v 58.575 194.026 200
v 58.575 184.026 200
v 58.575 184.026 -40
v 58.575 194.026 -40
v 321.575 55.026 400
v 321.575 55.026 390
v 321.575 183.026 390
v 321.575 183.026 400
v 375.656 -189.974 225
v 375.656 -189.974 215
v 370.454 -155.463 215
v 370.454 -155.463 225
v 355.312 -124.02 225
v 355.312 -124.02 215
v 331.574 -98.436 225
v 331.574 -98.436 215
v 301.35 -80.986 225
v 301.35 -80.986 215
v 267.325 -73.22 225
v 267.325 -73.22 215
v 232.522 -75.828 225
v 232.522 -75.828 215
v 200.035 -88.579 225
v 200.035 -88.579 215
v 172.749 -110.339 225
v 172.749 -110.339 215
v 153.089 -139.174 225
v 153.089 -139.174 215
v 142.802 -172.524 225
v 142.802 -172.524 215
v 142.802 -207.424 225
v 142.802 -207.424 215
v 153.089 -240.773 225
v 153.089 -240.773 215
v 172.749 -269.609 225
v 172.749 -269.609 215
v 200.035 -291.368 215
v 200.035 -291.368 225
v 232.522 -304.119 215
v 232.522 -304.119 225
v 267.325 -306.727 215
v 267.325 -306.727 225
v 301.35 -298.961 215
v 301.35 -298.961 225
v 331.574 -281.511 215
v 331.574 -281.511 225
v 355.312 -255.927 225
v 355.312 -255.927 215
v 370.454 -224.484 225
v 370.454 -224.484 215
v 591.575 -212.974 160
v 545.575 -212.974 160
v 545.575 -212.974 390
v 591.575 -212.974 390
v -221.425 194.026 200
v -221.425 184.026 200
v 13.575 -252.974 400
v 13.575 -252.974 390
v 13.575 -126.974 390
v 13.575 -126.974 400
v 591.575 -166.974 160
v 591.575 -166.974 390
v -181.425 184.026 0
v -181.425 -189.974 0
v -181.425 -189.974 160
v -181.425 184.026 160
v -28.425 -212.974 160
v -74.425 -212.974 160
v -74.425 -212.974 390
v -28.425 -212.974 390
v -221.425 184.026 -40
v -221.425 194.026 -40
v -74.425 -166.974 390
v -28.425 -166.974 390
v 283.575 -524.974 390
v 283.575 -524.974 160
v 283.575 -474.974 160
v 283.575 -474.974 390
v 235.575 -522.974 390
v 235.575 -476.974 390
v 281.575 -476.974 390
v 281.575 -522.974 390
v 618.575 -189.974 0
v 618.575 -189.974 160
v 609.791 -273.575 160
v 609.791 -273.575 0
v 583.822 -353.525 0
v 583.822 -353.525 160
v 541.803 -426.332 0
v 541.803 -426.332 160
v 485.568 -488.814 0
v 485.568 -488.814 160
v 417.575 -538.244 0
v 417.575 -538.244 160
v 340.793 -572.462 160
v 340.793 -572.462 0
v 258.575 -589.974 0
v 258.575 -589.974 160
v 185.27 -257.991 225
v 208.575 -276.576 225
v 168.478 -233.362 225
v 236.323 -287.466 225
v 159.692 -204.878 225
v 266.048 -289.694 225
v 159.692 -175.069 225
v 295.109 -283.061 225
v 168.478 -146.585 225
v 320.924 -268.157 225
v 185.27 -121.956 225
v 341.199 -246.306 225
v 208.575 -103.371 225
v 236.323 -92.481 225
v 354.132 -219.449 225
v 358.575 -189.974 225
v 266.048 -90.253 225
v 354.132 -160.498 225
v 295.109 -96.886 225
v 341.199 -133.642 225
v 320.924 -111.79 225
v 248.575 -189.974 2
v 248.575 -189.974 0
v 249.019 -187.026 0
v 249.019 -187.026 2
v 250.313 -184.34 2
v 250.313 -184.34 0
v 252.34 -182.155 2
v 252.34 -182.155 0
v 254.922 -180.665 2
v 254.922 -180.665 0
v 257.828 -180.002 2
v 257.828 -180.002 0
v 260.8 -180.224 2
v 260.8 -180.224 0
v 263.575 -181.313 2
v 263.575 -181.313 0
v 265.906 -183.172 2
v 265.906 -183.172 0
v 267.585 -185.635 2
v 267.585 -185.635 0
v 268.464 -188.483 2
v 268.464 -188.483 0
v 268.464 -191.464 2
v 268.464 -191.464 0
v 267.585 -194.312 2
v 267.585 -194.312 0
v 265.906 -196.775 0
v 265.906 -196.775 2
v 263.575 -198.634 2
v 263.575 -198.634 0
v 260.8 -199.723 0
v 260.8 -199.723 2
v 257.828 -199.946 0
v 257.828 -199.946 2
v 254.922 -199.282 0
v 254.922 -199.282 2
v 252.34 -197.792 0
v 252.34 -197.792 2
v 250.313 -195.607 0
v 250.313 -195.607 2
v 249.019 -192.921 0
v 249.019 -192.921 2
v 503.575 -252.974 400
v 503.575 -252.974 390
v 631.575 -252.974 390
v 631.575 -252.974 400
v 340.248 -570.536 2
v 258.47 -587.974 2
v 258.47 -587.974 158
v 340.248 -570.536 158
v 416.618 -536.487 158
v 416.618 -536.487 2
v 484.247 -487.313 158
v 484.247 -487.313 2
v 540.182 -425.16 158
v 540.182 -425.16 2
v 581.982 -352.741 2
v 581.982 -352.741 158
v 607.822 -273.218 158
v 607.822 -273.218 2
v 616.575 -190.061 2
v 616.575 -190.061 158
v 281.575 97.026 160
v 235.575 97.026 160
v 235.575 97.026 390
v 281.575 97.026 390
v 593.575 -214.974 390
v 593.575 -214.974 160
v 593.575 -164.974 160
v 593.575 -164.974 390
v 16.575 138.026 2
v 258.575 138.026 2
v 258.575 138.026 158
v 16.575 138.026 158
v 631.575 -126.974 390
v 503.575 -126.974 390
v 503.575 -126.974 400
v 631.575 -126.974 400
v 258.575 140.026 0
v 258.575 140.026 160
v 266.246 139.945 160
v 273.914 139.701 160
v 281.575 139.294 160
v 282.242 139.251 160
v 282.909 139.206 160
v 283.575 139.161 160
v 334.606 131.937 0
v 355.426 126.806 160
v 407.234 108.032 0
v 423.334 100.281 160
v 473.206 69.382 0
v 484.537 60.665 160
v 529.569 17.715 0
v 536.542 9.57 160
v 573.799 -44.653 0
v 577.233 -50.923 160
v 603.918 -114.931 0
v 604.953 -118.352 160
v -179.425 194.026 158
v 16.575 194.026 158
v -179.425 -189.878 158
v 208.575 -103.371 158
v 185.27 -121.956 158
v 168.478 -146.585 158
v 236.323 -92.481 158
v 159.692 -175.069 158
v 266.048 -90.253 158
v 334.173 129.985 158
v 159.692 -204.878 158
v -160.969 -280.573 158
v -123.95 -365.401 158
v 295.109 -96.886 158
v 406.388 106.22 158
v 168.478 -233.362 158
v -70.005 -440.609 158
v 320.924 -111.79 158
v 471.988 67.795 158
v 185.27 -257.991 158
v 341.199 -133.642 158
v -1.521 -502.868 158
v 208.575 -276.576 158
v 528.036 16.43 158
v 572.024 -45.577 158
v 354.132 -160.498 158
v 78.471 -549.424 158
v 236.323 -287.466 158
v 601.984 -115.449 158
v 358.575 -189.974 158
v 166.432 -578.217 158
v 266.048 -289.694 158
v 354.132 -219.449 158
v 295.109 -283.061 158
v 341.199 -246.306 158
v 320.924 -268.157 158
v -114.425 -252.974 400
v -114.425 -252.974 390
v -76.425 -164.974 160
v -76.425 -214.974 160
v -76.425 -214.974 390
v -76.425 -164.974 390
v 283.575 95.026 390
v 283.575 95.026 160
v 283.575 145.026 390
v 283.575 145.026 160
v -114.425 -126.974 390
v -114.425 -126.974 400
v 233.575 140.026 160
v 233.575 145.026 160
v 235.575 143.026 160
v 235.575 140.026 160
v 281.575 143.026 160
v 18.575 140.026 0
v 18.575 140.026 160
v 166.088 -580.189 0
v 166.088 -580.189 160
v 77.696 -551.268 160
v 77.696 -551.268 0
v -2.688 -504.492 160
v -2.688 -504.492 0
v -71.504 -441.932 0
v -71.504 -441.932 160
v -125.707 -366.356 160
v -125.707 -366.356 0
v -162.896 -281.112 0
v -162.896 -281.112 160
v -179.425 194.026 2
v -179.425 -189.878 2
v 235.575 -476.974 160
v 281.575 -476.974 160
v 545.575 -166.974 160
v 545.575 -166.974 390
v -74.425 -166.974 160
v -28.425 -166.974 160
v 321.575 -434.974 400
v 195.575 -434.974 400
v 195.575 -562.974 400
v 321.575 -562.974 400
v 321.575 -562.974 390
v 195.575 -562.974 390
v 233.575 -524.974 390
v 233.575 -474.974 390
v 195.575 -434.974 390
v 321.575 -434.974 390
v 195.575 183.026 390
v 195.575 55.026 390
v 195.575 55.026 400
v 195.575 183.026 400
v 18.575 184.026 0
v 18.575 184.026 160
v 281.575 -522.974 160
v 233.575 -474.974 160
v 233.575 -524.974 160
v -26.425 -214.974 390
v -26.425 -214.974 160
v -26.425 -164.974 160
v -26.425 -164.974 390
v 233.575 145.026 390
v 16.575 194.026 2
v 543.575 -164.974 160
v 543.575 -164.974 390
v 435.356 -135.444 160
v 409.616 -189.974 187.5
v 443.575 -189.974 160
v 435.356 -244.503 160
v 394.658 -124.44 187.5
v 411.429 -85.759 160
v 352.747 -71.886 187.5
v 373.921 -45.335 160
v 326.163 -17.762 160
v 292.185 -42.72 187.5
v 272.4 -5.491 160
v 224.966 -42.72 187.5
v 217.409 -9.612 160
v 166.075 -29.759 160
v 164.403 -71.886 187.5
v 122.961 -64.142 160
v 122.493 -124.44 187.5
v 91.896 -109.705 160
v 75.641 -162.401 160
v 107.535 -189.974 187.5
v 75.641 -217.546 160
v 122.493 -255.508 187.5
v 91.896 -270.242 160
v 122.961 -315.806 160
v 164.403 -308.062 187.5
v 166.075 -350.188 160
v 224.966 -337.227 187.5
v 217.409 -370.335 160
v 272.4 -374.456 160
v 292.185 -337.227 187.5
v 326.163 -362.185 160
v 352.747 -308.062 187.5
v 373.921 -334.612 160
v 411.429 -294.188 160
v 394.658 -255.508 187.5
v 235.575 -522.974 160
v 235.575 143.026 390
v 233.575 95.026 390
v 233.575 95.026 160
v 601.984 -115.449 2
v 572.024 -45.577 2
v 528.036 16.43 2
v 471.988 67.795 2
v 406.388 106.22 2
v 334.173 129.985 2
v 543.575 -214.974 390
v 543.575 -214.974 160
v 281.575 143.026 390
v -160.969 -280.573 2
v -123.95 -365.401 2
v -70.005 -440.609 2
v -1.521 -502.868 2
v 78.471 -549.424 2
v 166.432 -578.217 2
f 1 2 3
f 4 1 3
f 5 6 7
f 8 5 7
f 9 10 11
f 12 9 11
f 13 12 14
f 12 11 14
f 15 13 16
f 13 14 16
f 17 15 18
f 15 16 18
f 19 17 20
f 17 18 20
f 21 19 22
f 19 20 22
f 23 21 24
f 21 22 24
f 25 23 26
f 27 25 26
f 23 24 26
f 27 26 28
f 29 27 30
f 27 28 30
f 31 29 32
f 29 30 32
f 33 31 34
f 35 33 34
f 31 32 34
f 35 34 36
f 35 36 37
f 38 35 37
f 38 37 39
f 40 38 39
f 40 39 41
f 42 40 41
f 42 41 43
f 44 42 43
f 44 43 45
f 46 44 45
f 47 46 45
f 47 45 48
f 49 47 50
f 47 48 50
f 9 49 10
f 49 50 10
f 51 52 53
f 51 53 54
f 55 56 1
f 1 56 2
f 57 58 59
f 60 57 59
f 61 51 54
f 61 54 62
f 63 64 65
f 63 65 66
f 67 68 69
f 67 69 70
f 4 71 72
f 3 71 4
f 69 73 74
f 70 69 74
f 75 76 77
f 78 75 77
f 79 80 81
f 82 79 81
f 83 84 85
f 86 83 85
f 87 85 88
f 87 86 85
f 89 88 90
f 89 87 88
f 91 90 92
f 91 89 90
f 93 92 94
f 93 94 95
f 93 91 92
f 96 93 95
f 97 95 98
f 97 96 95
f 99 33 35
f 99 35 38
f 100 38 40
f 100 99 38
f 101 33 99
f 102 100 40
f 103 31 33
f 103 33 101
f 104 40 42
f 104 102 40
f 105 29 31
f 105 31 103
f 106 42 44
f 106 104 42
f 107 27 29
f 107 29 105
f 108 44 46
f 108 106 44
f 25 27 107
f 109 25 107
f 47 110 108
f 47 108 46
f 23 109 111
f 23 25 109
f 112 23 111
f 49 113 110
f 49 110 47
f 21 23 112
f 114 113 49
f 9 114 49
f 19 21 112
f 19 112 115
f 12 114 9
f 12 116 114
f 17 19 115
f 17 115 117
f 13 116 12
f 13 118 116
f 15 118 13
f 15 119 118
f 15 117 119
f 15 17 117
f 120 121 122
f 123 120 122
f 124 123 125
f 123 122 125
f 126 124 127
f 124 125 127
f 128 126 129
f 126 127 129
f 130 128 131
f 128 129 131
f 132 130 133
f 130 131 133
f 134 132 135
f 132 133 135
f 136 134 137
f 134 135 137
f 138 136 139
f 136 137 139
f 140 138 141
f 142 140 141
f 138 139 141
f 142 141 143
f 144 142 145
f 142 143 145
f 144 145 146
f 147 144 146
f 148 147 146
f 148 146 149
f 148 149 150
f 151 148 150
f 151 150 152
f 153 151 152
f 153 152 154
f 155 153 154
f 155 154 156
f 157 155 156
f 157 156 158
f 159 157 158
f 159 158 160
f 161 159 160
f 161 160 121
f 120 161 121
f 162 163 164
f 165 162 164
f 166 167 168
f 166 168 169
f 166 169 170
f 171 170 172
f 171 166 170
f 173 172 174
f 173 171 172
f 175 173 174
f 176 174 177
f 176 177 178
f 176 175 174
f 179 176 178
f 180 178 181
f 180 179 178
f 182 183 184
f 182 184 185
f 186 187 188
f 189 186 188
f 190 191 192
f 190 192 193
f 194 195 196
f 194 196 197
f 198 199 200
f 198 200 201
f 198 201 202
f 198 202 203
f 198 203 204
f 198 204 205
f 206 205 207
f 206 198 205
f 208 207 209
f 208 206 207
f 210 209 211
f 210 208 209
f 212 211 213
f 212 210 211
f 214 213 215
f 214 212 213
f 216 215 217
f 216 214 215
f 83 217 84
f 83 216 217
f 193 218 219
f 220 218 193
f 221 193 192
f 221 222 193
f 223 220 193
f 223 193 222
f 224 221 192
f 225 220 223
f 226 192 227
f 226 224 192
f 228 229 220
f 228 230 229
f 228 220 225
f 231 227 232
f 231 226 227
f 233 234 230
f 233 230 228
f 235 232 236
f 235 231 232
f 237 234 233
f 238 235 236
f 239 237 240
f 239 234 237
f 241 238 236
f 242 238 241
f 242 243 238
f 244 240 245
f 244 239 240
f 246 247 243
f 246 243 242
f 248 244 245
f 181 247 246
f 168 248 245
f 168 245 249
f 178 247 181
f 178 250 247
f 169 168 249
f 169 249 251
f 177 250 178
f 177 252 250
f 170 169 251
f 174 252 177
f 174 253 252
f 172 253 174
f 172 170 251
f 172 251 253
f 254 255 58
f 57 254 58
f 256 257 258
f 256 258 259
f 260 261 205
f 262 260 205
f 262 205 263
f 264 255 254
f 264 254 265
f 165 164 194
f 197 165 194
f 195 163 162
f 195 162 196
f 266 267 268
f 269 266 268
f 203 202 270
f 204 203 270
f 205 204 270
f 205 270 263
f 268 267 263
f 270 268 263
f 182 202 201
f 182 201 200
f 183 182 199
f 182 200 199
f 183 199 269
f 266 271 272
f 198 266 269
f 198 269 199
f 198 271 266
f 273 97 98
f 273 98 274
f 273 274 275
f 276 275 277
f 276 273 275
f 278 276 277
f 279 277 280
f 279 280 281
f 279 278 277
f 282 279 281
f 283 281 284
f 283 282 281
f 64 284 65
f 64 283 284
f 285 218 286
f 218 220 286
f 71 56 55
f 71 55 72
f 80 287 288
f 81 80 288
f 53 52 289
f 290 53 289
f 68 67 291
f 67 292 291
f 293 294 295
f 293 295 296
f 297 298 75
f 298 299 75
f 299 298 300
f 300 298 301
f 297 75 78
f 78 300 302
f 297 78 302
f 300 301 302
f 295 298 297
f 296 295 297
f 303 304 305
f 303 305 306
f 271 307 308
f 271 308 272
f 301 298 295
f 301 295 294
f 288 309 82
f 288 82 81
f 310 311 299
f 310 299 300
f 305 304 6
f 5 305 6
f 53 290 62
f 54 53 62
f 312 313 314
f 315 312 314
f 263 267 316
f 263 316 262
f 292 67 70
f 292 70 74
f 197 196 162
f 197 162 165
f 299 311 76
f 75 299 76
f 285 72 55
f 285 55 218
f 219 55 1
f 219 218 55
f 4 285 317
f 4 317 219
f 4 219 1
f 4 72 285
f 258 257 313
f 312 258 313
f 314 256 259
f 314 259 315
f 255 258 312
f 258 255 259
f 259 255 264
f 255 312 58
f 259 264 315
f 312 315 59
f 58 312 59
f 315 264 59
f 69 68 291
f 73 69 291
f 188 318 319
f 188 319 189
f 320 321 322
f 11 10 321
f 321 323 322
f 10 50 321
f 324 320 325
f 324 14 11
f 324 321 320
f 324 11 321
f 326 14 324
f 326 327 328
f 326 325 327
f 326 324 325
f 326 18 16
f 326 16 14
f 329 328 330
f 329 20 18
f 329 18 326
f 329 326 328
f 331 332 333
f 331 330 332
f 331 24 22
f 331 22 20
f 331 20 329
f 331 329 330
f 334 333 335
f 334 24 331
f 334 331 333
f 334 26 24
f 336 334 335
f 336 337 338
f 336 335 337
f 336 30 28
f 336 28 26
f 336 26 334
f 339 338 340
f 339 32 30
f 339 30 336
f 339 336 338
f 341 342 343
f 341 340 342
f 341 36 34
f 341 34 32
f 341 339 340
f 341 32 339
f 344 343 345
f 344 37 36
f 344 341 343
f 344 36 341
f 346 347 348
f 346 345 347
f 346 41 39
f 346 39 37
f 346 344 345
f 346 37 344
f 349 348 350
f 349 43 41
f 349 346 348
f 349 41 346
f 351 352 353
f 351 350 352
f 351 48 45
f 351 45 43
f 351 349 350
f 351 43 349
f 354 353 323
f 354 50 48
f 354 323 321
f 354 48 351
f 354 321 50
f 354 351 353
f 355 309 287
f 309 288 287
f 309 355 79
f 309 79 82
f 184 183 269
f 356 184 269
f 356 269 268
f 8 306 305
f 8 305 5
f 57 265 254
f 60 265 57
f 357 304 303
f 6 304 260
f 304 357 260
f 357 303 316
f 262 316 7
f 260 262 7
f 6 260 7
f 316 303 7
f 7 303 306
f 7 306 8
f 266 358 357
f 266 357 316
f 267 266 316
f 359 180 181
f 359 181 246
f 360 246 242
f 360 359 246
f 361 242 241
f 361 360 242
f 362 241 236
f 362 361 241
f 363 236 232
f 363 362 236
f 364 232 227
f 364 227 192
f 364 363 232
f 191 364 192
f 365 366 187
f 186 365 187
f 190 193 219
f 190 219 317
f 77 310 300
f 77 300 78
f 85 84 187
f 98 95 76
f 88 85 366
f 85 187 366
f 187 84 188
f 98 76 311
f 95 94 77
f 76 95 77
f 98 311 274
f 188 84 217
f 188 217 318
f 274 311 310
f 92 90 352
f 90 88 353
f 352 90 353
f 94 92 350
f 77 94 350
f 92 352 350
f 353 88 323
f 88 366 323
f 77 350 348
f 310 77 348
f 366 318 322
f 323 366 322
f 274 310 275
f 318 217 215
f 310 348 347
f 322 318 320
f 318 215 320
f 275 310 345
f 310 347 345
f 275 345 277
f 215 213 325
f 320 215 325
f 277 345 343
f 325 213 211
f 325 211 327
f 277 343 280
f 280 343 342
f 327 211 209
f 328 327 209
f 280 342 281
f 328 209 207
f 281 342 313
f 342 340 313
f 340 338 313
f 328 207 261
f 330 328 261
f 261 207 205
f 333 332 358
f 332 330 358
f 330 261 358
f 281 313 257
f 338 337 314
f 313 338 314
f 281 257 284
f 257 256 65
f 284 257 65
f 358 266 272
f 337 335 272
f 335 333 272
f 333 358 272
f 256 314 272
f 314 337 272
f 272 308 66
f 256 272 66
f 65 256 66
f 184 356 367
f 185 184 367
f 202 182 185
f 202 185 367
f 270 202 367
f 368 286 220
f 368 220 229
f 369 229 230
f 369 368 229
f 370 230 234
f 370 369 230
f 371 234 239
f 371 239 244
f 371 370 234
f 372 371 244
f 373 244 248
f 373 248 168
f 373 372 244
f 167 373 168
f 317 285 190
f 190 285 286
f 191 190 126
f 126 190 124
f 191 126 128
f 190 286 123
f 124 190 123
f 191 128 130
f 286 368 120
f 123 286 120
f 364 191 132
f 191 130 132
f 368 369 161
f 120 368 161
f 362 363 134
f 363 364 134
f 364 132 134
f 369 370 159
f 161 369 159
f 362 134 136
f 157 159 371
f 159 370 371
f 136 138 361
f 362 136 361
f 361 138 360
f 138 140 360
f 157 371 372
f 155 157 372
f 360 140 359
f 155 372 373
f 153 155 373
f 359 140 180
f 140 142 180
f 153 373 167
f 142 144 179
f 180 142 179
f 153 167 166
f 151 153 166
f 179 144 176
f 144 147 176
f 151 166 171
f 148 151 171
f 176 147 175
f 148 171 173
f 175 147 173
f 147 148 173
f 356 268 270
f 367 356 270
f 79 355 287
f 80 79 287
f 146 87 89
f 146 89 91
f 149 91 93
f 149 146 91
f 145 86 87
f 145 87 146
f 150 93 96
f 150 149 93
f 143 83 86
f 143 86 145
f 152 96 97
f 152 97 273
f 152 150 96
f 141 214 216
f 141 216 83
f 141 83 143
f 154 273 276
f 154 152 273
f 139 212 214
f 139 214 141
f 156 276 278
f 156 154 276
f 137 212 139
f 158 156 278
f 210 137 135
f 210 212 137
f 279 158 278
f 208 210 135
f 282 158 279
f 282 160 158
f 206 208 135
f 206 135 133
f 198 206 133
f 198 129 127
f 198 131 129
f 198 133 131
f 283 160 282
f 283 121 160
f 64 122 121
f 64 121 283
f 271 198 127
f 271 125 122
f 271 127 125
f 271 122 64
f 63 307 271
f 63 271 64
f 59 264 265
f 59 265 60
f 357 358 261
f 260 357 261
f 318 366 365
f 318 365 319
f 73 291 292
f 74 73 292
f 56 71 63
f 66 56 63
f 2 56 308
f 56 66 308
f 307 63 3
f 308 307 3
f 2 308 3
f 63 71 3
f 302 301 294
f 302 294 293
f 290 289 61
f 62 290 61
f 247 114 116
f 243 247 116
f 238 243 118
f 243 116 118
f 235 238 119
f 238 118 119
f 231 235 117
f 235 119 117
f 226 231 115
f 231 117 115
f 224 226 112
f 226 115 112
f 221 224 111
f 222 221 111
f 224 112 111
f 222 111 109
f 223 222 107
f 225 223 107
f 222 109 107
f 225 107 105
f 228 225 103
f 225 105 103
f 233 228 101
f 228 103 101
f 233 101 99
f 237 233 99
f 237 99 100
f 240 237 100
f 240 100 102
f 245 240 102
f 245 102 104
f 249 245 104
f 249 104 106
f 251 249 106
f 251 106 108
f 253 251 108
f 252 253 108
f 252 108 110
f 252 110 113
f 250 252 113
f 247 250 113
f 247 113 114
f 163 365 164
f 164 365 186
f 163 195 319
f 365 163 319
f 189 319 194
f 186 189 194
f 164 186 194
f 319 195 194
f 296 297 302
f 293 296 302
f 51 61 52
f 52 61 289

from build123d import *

# Parameters (mm, degrees)
BOSS_EXTRUDE1_DEPTH       = 160
SHELL4_START              = 2
SHELL4_DEPTH              = 156
SKETCH5_R                 = 90
CUT_EXTRUDE1_DEPTH        = 118
SKETCH6_R                 = 185
BOSS_EXTRUDE2_DEPTH       = 55
BOSS_EXTRUDE2_TAPER       = 51
SKETCH7_R                 = 117.080656391
BOSS_EXTRUDE3_DEPTH       = 10
SKETCH9_R                 = 100
CUT_EXTRUDE2_DEPTH        = 118
SKETCH11_R                = 10
CUT_EXTRUDE3_DEPTH        = 118
SKETCH12_W                = 280
SKETCH12_H                = 240
SKETCH12_W_2              = 196
SKETCH12_H_2              = 156
BOSS_EXTRUDE4_DEPTH       = 10
EXTRUDE_THIN1_OUTLINE_W   = 50
EXTRUDE_THIN1_OUTLINE_H   = 50
EXTRUDE_THIN1_OUTLINE_W_2 = 46
EXTRUDE_THIN1_OUTLINE_H_2 = 46
EXTRUDE_THIN1_DEPTH       = 230
BOSS_EXTRUDE6_START       = 230
SKETCH15_W                = 126
SKETCH15_H                = 128
SKETCH15_W_2              = 128
SKETCH15_H_2              = 126
BOSS_EXTRUDE6_DEPTH       = 10


# Read off the part's stored shape, not the designer's step: Shell4, Extrude-Thin1
with BuildPart() as part:
    # Sketch1 → Boss-Extrude1 (new body)
    with BuildSketch(Plane.XY):
        with BuildLine():
            Line((-181.424802111, -189.973614776), (-181.424802111, 184.026385224))
            Line((-181.424802111, 184.026385224), (18.575197889, 184.026385224))
            Line((18.575197889, 184.026385224), (18.575197889, 140.026385224))
            Line((18.575197889, 140.026385224), (258.575197889, 140.026385224))
            ThreePointArc((258.575197889, 140.026385224), (502.757506831, 45.043449524), (618.575197889, -189.973614776))
            ThreePointArc((618.575197889, -189.973614776), (515.322398935, -459.046095717), (258.575197889, -589.973614776))
            ThreePointArc((258.575197889, -589.973614776), (-38.746177057, -475.027127217), (-181.424802111, -189.973614776))
        make_face()
    extrude(amount=BOSS_EXTRUDE1_DEPTH)

    # Shell4 outline → Shell4 (cut)
    with BuildSketch(Plane.XY.offset(SHELL4_START)):
        with BuildLine():
            ThreePointArc((-179.424802111, -189.878268455), (-37.404584917, -473.543834805), (258.469922203, -587.973602181))
            ThreePointArc((258.469922203, -587.973602181), (513.841925832, -457.701371443), (616.57518844, -190.060584018))
            ThreePointArc((616.57518844, -190.060584018), (501.374009985, 43.598514633), (258.575197889, 138.026385224))
            Line((258.575197889, 138.026385224), (16.575197889, 138.026385224))
            Line((16.575197889, 138.026385224), (16.575197889, 184.026385224))
            Line((16.575197889, 184.026385224), (-179.424802111, 184.026385224))
            Line((-179.424802111, 184.026385224), (-179.424802111, -189.878268455))
        make_face()
    extrude(amount=SHELL4_DEPTH, mode=Mode.SUBTRACT)

    # Sketch5 → Cut-Extrude1 (cut)
    with BuildSketch(Plane.XY.offset(160)):
        with Locations((258.575197889, -189.973614776)):
            Circle(SKETCH5_R)
    extrude(amount=-CUT_EXTRUDE1_DEPTH, mode=Mode.SUBTRACT)

    # Sketch6 → Boss-Extrude2 (add)
    with BuildSketch(Plane.XY.offset(160)):
        with Locations((258.575197889, -189.973614776)):
            Circle(SKETCH6_R)
    extrude(amount=BOSS_EXTRUDE2_DEPTH, taper=BOSS_EXTRUDE2_TAPER)

    # Sketch7 → Boss-Extrude3 (add)
    with BuildSketch(Plane.XY.offset(215)):
        with Locations((258.575197889, -189.973614776)):
            Circle(SKETCH7_R)
    extrude(amount=BOSS_EXTRUDE3_DEPTH)

    # Sketch9 → Cut-Extrude2 (cut)
    with BuildSketch(Plane.XY.offset(225)):
        with Locations((258.575197889, -189.973614776)):
            Circle(SKETCH9_R)
    extrude(amount=-CUT_EXTRUDE2_DEPTH, mode=Mode.SUBTRACT)

    # Sketch11 → Cut-Extrude3 (cut)
    with BuildSketch(Plane(origin=(0, 0, 0), x_dir=(-1, 0, 0), z_dir=(0, 0, -1))):
        with Locations((-258.575197889, -189.973614776)):
            Circle(SKETCH11_R)
    extrude(amount=-CUT_EXTRUDE3_DEPTH, mode=Mode.SUBTRACT)

    # Sketch12 → Boss-Extrude4 (add)
    with BuildSketch(Plane(origin=(0, 184.026385224, 0), x_dir=(1, 0, 0), z_dir=(0, 1, 0))):
        with Locations((-81.424802111, -80)):
            Rectangle(SKETCH12_W, SKETCH12_H)
        with Locations((-81.424802111, -80)):
            Rectangle(SKETCH12_W_2, SKETCH12_H_2, mode=Mode.SUBTRACT)
    extrude(amount=BOSS_EXTRUDE4_DEPTH)

    # Extrude-Thin1 outline → Extrude-Thin1 (add)
    # profile 1 of 4: a face of its own
    with BuildSketch(Plane.XY.offset(160)):
        with Locations((-51.424802111, -189.973614776)):
            Rectangle(EXTRUDE_THIN1_OUTLINE_W, EXTRUDE_THIN1_OUTLINE_H)
        with Locations((-51.424802111, -189.973614776)):
            Rectangle(EXTRUDE_THIN1_OUTLINE_W_2, EXTRUDE_THIN1_OUTLINE_H_2, mode=Mode.SUBTRACT)
    # profile 2 of 4: a face of its own
    with BuildSketch(Plane.XY.offset(160)):
        with Locations((568.575197889, -189.973614776)):
            Rectangle(EXTRUDE_THIN1_OUTLINE_W, EXTRUDE_THIN1_OUTLINE_H)
        with Locations((568.575197889, -189.973614776)):
            Rectangle(EXTRUDE_THIN1_OUTLINE_W_2, EXTRUDE_THIN1_OUTLINE_H_2, mode=Mode.SUBTRACT)
    # profile 3 of 4: a face of its own
    with BuildSketch(Plane.XY.offset(160)):
        with Locations((258.575197889, 120.026385224)):
            Rectangle(EXTRUDE_THIN1_OUTLINE_W, EXTRUDE_THIN1_OUTLINE_H)
        with Locations((258.575197889, 120.026385224)):
            Rectangle(EXTRUDE_THIN1_OUTLINE_W_2, EXTRUDE_THIN1_OUTLINE_H_2, mode=Mode.SUBTRACT)
    # profile 4 of 4: a face of its own
    with BuildSketch(Plane.XY.offset(160)):
        with Locations((258.575197889, -499.973614776)):
            Rectangle(EXTRUDE_THIN1_OUTLINE_W, EXTRUDE_THIN1_OUTLINE_H)
        with Locations((258.575197889, -499.973614776)):
            Rectangle(EXTRUDE_THIN1_OUTLINE_W_2, EXTRUDE_THIN1_OUTLINE_H_2, mode=Mode.SUBTRACT)
    extrude(amount=EXTRUDE_THIN1_DEPTH)

    # Sketch15 → Boss-Extrude6 (add)
    with BuildSketch(Plane.XY.offset(160).offset(BOSS_EXTRUDE6_START)):
        with Locations((258.575197889, -498.973614776)):
            Rectangle(SKETCH15_W, SKETCH15_H)
        with Locations((-50.424802111, -189.973614776)):
            Rectangle(SKETCH15_W_2, SKETCH15_H_2)
        with Locations((258.575197889, 119.026385224)):
            Rectangle(SKETCH15_W, SKETCH15_H)
        with Locations((567.575197889, -189.973614776)):
            Rectangle(SKETCH15_W_2, SKETCH15_H_2)
    extrude(amount=BOSS_EXTRUDE6_DEPTH)


solid = part.part
